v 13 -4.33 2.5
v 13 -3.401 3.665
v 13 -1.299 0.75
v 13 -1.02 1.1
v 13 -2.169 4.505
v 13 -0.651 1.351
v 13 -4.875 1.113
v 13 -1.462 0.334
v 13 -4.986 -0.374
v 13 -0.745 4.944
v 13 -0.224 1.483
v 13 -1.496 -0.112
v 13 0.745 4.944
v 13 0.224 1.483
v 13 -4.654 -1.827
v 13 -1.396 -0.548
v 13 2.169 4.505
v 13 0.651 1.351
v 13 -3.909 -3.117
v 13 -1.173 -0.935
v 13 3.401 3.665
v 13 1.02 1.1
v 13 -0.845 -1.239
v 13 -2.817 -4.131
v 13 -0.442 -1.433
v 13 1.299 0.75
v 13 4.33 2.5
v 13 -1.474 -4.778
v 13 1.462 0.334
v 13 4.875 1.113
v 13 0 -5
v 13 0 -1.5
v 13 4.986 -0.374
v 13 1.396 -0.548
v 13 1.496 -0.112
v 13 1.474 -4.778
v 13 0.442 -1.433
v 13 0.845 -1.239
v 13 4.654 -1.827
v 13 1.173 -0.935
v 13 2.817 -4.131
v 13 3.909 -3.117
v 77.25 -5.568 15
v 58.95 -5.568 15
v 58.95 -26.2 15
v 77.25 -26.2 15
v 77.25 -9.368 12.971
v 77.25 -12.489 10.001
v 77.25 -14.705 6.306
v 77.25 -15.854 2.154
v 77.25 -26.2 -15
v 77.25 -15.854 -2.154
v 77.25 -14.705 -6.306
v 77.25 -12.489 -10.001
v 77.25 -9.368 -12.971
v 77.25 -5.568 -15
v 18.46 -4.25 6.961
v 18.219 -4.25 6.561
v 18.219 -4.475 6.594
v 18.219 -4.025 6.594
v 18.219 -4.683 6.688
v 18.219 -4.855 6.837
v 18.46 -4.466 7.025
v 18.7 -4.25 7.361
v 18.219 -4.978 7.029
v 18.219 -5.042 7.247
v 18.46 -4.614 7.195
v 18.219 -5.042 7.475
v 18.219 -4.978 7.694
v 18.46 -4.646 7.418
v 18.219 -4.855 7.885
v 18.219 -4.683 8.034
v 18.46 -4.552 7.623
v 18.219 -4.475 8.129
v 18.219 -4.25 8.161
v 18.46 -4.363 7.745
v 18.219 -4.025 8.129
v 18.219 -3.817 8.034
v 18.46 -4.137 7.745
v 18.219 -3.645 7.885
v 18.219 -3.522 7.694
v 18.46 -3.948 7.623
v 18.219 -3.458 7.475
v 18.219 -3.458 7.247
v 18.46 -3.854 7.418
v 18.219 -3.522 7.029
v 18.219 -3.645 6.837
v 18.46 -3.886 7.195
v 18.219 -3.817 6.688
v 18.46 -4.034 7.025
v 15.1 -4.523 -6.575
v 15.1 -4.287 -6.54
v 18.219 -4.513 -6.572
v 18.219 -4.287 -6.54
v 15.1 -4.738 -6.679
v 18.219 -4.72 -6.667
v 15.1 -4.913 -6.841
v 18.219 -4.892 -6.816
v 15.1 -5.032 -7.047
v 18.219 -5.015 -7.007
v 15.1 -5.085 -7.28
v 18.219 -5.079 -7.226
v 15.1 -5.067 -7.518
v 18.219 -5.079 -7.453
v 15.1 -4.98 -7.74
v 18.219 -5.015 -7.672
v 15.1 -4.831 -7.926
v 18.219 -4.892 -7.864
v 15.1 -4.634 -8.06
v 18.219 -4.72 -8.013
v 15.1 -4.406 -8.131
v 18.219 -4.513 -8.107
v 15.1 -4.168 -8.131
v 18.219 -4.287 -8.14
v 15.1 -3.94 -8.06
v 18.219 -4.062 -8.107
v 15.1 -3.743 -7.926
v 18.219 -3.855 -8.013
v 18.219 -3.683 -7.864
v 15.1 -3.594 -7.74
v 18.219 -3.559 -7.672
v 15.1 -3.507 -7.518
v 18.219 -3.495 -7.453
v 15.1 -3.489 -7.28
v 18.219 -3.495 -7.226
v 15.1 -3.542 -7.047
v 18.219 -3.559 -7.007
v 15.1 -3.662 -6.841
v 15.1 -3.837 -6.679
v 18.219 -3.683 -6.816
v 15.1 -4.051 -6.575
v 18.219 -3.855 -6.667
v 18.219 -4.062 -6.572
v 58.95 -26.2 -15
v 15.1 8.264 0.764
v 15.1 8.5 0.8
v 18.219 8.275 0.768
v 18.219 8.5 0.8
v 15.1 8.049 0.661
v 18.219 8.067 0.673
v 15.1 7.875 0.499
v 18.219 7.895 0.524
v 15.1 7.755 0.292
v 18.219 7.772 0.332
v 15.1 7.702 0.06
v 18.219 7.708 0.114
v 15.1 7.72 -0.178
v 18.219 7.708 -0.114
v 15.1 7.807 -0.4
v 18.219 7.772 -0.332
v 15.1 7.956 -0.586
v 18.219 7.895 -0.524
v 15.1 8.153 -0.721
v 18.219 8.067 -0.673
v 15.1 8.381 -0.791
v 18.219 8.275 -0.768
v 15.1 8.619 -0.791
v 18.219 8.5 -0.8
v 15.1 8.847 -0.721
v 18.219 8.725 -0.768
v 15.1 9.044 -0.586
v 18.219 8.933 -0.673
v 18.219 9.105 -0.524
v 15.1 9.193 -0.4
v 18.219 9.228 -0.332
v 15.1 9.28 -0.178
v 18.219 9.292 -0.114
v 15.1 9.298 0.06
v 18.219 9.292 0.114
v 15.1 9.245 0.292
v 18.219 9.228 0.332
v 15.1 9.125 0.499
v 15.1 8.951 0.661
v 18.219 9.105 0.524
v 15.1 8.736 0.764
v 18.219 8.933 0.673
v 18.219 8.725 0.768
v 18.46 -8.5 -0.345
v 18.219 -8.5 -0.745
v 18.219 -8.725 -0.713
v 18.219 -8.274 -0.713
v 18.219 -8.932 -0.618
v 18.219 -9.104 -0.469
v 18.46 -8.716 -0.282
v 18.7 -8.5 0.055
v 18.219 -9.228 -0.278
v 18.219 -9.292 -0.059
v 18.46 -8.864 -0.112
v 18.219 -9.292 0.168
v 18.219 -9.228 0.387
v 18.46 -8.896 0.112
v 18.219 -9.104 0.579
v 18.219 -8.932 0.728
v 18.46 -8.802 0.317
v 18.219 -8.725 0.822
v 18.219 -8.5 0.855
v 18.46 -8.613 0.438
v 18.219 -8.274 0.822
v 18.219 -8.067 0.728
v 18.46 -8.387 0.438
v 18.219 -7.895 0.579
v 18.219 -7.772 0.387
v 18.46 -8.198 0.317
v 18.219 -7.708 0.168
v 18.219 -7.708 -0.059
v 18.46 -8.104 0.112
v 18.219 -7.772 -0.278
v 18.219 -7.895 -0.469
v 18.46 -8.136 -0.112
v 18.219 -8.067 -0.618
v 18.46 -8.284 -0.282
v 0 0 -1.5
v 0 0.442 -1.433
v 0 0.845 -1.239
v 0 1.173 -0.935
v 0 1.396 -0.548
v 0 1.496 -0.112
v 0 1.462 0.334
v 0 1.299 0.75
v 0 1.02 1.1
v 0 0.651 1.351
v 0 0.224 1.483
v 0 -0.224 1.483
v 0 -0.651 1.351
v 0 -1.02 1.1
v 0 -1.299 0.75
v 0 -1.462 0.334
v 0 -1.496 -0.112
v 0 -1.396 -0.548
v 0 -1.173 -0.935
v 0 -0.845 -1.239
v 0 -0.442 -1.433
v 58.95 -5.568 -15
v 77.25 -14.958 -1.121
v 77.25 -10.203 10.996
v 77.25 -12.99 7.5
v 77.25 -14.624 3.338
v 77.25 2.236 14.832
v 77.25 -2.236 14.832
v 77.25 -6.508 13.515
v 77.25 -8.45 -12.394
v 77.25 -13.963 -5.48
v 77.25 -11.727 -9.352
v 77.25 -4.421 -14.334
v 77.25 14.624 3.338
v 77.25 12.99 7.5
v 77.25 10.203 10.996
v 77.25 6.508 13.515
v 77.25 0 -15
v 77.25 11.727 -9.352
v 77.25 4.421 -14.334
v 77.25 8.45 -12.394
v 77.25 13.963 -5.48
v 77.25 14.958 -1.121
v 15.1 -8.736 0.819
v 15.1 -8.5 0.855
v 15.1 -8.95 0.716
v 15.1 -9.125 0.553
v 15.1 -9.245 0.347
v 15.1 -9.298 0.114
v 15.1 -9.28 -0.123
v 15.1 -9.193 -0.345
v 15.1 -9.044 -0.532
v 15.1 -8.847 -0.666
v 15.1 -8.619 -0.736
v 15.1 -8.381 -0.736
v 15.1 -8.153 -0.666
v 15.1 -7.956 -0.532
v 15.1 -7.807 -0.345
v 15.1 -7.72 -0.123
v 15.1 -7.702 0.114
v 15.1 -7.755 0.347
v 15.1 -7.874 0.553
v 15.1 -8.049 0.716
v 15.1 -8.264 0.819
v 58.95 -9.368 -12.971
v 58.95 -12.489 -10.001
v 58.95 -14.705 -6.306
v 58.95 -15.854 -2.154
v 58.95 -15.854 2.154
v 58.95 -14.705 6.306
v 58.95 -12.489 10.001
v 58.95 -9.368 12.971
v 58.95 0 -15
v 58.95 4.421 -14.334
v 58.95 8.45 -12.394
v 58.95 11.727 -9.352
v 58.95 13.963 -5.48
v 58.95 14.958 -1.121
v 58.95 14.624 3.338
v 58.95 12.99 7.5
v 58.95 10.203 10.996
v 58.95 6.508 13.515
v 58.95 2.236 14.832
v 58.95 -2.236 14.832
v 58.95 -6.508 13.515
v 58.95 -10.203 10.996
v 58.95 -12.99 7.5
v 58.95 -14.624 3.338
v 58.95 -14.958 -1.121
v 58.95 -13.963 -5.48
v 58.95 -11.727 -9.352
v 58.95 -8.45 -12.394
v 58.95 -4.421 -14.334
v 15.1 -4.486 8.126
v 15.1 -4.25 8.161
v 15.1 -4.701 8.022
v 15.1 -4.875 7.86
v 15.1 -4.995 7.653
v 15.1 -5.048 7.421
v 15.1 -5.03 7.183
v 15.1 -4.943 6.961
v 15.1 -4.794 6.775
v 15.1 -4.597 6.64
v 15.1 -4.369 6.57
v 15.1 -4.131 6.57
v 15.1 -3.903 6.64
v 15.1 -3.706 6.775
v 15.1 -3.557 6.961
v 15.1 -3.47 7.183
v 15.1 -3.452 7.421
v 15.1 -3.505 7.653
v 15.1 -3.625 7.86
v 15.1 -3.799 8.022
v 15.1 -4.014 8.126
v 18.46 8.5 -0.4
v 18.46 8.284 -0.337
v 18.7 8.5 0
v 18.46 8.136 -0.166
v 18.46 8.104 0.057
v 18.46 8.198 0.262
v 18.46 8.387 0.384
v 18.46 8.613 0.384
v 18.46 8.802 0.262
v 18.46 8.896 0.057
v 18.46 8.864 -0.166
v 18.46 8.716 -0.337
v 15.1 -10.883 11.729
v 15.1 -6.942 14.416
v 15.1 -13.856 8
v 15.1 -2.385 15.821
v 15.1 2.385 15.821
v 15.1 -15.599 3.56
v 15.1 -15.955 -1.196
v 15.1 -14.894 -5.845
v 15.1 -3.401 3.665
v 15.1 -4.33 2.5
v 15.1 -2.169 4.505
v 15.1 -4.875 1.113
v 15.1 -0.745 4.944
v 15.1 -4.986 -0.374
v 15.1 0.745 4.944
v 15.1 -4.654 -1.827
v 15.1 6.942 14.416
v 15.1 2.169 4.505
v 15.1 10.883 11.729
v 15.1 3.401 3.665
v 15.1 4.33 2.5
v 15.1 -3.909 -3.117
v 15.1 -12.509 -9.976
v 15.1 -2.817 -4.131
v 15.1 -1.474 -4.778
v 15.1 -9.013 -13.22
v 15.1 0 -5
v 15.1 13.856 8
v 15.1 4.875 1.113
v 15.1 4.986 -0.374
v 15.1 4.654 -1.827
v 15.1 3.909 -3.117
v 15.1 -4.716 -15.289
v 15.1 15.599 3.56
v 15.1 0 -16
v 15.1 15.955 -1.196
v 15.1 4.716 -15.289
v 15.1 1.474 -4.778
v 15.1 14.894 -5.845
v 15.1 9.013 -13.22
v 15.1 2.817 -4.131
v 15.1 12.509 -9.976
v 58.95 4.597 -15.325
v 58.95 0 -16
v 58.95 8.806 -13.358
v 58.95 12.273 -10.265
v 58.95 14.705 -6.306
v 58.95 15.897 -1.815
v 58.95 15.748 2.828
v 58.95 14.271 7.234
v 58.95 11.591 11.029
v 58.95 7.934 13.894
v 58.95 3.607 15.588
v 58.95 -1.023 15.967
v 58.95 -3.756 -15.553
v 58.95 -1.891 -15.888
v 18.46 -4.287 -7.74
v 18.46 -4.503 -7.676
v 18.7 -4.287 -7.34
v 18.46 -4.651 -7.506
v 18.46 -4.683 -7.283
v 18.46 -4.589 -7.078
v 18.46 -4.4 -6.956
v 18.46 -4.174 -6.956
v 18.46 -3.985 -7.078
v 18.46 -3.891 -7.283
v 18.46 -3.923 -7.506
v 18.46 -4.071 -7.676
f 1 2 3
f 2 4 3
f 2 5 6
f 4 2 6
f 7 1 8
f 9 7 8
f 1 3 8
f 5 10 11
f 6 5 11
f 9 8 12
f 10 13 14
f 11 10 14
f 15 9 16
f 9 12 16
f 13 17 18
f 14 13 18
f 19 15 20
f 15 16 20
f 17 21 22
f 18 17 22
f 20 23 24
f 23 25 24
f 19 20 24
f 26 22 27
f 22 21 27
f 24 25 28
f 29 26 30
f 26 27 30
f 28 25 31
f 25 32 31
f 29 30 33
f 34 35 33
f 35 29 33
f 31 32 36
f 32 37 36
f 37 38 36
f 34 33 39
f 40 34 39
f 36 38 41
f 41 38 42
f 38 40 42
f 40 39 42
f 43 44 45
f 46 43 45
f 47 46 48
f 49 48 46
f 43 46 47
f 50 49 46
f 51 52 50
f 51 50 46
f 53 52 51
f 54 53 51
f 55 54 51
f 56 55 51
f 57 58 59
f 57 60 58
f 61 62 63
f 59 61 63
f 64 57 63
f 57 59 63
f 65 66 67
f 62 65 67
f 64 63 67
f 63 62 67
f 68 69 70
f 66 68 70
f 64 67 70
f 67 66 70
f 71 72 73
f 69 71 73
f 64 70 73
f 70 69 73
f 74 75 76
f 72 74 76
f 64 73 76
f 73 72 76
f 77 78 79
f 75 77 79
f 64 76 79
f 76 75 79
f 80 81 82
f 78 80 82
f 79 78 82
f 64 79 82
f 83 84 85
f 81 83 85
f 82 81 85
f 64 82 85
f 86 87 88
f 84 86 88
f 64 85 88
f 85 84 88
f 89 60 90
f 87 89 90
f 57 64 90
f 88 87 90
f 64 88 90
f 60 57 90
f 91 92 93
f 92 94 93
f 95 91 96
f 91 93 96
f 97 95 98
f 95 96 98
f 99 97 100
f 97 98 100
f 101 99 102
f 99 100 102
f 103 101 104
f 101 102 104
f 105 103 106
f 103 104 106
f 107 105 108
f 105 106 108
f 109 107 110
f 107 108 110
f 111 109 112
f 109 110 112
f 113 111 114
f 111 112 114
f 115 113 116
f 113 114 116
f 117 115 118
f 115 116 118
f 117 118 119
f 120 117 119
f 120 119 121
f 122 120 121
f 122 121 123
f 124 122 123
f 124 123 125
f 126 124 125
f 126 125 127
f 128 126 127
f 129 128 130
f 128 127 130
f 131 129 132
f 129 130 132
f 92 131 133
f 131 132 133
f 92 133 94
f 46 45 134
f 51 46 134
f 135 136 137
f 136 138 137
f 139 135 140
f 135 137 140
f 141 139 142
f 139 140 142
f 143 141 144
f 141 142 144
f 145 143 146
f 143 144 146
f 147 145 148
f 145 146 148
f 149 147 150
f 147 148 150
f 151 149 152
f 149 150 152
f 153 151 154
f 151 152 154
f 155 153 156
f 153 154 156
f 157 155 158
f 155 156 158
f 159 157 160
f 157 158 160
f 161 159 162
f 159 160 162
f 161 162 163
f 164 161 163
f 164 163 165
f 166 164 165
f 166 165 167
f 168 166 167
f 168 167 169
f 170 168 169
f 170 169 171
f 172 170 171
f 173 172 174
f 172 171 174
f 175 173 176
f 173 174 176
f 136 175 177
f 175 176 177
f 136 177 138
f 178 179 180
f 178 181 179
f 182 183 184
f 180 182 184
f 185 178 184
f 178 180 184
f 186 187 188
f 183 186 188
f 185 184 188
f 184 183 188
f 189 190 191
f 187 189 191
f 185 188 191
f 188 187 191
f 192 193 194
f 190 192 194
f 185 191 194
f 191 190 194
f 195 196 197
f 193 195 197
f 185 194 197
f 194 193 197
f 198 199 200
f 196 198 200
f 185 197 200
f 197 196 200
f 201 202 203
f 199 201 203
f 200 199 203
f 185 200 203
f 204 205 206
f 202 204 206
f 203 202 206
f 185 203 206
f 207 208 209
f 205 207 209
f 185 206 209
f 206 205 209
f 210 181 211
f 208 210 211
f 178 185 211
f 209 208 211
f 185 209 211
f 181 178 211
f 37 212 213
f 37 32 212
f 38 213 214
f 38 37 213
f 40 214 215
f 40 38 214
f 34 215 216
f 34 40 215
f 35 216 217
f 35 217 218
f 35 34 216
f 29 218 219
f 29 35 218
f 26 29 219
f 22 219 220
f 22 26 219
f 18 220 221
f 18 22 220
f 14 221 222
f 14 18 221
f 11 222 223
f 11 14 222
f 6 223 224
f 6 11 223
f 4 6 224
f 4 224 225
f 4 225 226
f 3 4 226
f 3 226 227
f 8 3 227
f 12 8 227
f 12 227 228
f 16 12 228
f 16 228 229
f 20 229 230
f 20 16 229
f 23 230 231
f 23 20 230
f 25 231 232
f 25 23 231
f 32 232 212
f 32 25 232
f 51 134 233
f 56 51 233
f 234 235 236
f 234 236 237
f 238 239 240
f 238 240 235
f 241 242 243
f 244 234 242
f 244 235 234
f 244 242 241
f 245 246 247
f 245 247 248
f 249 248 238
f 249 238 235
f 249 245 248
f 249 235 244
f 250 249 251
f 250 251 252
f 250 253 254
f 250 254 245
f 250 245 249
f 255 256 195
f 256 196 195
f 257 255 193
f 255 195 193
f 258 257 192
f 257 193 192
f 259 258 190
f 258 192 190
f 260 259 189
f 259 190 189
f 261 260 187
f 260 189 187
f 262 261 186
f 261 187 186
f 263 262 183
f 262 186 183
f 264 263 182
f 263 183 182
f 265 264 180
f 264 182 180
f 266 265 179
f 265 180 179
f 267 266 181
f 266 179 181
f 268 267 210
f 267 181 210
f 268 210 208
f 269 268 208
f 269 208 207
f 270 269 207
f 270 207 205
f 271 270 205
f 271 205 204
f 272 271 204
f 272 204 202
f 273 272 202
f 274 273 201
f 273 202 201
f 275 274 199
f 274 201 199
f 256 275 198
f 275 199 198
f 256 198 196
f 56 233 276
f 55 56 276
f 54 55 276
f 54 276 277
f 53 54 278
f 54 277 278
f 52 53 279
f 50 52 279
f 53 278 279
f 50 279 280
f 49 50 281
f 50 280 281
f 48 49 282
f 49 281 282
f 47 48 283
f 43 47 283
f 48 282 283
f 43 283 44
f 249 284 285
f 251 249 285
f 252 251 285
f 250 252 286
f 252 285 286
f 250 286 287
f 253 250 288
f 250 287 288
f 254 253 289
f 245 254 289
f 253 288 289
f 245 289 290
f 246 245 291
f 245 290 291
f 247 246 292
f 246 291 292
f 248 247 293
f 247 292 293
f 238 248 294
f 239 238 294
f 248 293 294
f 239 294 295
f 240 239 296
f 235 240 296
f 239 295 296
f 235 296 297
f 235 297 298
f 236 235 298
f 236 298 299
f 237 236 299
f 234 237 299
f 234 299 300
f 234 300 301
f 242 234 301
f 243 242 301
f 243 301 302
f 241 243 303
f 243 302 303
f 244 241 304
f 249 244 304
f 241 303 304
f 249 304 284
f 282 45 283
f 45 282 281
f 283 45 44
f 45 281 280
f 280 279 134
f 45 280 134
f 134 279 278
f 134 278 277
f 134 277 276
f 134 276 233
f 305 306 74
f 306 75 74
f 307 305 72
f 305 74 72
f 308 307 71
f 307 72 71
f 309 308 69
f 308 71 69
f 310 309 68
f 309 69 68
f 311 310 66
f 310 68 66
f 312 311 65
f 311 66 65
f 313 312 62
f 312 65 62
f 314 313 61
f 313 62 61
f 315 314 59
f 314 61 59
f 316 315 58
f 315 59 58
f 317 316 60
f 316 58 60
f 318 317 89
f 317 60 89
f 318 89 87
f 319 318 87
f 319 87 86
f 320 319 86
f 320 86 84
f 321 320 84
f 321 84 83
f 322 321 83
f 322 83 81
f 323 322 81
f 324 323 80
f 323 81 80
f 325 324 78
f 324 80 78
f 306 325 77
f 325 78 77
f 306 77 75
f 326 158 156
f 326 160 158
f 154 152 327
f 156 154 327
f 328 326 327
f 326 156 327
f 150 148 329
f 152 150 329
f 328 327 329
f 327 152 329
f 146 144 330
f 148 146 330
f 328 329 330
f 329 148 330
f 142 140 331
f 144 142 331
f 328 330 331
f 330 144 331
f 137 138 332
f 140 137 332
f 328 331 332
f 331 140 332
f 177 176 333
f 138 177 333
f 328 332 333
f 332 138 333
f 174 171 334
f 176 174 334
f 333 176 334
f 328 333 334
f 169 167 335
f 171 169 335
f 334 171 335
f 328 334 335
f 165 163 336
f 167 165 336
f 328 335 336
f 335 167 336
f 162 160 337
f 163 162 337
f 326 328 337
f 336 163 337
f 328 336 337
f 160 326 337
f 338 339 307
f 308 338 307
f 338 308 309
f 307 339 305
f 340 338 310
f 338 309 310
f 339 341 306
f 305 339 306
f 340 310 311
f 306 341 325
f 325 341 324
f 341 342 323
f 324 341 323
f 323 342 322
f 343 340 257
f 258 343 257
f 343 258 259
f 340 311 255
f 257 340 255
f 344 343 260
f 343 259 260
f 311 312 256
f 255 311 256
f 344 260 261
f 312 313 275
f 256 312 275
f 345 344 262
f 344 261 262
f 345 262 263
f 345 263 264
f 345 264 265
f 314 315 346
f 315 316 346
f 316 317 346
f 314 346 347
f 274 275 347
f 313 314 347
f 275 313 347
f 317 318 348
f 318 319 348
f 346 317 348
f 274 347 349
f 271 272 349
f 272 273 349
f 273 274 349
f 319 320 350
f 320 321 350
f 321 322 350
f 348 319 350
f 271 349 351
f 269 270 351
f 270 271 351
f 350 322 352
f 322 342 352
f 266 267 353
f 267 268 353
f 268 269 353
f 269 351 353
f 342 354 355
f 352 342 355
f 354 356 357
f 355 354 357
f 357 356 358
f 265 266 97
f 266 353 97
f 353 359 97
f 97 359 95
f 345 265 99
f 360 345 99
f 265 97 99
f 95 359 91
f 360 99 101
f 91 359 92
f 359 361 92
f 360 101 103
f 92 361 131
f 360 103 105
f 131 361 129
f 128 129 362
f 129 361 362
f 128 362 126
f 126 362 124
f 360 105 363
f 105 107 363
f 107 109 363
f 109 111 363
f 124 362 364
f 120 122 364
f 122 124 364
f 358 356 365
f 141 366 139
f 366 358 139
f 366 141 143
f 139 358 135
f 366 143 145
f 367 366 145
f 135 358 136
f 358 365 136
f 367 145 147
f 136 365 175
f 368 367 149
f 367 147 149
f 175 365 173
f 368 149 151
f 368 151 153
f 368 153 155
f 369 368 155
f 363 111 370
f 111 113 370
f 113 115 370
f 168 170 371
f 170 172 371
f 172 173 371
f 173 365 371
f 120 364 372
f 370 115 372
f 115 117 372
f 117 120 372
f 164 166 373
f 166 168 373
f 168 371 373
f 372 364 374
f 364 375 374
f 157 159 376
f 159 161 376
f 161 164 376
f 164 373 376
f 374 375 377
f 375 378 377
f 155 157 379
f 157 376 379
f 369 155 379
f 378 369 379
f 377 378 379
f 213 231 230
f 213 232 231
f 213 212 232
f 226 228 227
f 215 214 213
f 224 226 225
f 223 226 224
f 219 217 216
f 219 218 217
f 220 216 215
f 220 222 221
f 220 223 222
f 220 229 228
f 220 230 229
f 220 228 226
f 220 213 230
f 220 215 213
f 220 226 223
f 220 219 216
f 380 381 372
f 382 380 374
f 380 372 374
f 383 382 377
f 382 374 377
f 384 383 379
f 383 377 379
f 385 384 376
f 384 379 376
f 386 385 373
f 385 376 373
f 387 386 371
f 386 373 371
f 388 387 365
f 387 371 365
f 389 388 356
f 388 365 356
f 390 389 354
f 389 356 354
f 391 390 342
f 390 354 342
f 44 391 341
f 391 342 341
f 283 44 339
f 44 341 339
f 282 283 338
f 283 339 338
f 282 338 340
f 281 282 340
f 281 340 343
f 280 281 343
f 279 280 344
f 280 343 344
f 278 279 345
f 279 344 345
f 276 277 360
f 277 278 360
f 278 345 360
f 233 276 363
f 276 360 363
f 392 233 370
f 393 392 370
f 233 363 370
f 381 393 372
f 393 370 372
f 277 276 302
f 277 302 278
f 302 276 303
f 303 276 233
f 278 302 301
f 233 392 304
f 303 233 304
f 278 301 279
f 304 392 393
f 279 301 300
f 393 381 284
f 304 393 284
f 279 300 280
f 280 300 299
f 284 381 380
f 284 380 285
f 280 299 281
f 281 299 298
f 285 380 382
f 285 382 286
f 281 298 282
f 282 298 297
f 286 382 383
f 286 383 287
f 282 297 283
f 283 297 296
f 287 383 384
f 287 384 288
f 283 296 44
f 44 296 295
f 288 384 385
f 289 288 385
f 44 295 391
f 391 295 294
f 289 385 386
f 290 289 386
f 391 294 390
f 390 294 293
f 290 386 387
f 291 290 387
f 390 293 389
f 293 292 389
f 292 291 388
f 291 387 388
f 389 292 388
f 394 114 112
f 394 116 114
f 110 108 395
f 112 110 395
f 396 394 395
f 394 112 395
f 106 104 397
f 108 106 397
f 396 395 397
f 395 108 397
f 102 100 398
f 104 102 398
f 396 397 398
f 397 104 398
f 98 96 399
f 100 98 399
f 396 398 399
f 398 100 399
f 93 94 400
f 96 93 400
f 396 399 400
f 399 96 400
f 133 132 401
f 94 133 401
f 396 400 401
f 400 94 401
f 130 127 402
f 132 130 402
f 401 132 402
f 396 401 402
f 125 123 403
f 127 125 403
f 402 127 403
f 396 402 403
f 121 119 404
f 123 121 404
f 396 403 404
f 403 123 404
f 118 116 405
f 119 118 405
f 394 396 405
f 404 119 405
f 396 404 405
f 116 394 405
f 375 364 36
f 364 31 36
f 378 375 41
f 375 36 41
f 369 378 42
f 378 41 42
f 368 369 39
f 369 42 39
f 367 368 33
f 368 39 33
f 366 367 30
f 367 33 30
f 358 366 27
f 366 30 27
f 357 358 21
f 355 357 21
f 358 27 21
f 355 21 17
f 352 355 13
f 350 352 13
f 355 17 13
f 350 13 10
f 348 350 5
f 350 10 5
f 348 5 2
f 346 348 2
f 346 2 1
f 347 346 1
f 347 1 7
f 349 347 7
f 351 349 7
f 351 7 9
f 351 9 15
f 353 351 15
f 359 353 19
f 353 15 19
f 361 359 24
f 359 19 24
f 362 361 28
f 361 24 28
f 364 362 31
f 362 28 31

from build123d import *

# Parameters (mm, degrees)
SKETCH1_W                   = 13
SKETCH1_H                   = 1.5
BOSS_EXTRUDE1_DEPTH         = 18.3
TAP_DRILL_FOR_M2_TAP1_D     = 1.6
TAP_DRILL_FOR_M2_TAP1_DEPTH = 3.119311505
TAP_DRILL_FOR_M2_TAP1_TIP   = 0.480688495


with BuildPart() as part:
    # Sketch1 → Revolve3 (revolve)
    with BuildSketch(Plane(origin=(0, 0, 0), x_dir=(1, 0, 0), z_dir=(0, 1, 0))):
        with Locations((6.5, 0.75)):
            Rectangle(SKETCH1_W, SKETCH1_H)
        Polygon((13, 1.5), (13, 0), (15.1, 0), (15.1, 5), (13, 5), align=None)
        Polygon((15.1, 5), (15.1, 0), (58.95, 0), (58.95, 16), (15.1, 16), align=None)
    revolve(axis=Axis((0, 0, 0), (1, 0, 0)))

    # Sketch2 → Boss-Extrude1 (add)
    with BuildSketch(Plane(origin=(58.95, 0, 0), x_dir=(0, 0, -1), z_dir=(1, 0, 0))):
        with BuildLine():
            ThreePointArc((15, -5.567764363), (0, -16), (-15, -5.567764363))
            Line((-15, -5.567764363), (-15, -26.2))
            Line((-15, -26.2), (15, -26.2))
            Line((15, -26.2), (15, -5.567764363))
        make_face()
        with BuildLine():
            Line((15, 0), (0, 0))
            Line((0, 0), (-15, 0))
            ThreePointArc((-15, 0), (0, -15), (15, 0))
        make_face()
        with BuildLine():
            Line((-15, 0), (0, 0))
            Line((0, 0), (15, 0))
            ThreePointArc((15, 0), (0, 15), (-15, 0))
        make_face()
    extrude(amount=BOSS_EXTRUDE1_DEPTH)

    # Tap Drill for M2 Tap1
    with Locations(Plane(origin=(15.1, 8.5, 0), x_dir=(0, 0, -1), z_dir=(-1, 0, 0))):
        with Locations((0, 0), (7.339624938, 12.787179232), (-7.361215932, 12.75), (-0.054633803, 16.999824419)):
            Hole(TAP_DRILL_FOR_M2_TAP1_D / 2, depth=TAP_DRILL_FOR_M2_TAP1_DEPTH)
            with Locations((0, 0, -(TAP_DRILL_FOR_M2_TAP1_DEPTH + TAP_DRILL_FOR_M2_TAP1_TIP / 2))):  # 118° drill point
                Cone(0, TAP_DRILL_FOR_M2_TAP1_D / 2, TAP_DRILL_FOR_M2_TAP1_TIP, mode=Mode.SUBTRACT)


solid = part.part
